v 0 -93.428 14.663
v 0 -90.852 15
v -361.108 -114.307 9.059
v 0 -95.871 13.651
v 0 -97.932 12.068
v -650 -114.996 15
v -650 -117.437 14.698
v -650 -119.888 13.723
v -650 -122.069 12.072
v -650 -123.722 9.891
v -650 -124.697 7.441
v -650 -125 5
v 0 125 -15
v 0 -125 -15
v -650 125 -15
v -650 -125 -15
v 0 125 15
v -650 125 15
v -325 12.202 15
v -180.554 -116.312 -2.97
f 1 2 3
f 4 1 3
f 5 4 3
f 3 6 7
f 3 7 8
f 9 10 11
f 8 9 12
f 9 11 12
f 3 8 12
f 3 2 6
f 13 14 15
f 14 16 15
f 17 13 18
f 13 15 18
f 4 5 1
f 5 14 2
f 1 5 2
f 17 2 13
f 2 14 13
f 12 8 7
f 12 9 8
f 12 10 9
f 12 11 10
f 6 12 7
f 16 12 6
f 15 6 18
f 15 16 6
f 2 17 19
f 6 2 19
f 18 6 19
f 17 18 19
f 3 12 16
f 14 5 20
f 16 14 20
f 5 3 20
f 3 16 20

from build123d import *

# Parameters (mm, degrees)
F2_W = 250
F2_H = 30
F4_R = 10


with BuildPart() as f3:
    # F0 (on Right) → F3 section 0
    with BuildSketch(Plane.YZ):
        Polygon((-125, -15), (125, -15), (125, 15), (-95, 15), align=None)
    # F2 (on offset) → F3 section 1
    with BuildSketch(Plane.YZ.offset(-650)):
        Rectangle(F2_W, F2_H)
    loft()

    # F4
    f4_edges = [f3.edges().sort_by_distance(p)[0] for p in [
        (-325, -110, 15),
    ]]
    fillet(f4_edges, radius=F4_R)


solid = f3.part
